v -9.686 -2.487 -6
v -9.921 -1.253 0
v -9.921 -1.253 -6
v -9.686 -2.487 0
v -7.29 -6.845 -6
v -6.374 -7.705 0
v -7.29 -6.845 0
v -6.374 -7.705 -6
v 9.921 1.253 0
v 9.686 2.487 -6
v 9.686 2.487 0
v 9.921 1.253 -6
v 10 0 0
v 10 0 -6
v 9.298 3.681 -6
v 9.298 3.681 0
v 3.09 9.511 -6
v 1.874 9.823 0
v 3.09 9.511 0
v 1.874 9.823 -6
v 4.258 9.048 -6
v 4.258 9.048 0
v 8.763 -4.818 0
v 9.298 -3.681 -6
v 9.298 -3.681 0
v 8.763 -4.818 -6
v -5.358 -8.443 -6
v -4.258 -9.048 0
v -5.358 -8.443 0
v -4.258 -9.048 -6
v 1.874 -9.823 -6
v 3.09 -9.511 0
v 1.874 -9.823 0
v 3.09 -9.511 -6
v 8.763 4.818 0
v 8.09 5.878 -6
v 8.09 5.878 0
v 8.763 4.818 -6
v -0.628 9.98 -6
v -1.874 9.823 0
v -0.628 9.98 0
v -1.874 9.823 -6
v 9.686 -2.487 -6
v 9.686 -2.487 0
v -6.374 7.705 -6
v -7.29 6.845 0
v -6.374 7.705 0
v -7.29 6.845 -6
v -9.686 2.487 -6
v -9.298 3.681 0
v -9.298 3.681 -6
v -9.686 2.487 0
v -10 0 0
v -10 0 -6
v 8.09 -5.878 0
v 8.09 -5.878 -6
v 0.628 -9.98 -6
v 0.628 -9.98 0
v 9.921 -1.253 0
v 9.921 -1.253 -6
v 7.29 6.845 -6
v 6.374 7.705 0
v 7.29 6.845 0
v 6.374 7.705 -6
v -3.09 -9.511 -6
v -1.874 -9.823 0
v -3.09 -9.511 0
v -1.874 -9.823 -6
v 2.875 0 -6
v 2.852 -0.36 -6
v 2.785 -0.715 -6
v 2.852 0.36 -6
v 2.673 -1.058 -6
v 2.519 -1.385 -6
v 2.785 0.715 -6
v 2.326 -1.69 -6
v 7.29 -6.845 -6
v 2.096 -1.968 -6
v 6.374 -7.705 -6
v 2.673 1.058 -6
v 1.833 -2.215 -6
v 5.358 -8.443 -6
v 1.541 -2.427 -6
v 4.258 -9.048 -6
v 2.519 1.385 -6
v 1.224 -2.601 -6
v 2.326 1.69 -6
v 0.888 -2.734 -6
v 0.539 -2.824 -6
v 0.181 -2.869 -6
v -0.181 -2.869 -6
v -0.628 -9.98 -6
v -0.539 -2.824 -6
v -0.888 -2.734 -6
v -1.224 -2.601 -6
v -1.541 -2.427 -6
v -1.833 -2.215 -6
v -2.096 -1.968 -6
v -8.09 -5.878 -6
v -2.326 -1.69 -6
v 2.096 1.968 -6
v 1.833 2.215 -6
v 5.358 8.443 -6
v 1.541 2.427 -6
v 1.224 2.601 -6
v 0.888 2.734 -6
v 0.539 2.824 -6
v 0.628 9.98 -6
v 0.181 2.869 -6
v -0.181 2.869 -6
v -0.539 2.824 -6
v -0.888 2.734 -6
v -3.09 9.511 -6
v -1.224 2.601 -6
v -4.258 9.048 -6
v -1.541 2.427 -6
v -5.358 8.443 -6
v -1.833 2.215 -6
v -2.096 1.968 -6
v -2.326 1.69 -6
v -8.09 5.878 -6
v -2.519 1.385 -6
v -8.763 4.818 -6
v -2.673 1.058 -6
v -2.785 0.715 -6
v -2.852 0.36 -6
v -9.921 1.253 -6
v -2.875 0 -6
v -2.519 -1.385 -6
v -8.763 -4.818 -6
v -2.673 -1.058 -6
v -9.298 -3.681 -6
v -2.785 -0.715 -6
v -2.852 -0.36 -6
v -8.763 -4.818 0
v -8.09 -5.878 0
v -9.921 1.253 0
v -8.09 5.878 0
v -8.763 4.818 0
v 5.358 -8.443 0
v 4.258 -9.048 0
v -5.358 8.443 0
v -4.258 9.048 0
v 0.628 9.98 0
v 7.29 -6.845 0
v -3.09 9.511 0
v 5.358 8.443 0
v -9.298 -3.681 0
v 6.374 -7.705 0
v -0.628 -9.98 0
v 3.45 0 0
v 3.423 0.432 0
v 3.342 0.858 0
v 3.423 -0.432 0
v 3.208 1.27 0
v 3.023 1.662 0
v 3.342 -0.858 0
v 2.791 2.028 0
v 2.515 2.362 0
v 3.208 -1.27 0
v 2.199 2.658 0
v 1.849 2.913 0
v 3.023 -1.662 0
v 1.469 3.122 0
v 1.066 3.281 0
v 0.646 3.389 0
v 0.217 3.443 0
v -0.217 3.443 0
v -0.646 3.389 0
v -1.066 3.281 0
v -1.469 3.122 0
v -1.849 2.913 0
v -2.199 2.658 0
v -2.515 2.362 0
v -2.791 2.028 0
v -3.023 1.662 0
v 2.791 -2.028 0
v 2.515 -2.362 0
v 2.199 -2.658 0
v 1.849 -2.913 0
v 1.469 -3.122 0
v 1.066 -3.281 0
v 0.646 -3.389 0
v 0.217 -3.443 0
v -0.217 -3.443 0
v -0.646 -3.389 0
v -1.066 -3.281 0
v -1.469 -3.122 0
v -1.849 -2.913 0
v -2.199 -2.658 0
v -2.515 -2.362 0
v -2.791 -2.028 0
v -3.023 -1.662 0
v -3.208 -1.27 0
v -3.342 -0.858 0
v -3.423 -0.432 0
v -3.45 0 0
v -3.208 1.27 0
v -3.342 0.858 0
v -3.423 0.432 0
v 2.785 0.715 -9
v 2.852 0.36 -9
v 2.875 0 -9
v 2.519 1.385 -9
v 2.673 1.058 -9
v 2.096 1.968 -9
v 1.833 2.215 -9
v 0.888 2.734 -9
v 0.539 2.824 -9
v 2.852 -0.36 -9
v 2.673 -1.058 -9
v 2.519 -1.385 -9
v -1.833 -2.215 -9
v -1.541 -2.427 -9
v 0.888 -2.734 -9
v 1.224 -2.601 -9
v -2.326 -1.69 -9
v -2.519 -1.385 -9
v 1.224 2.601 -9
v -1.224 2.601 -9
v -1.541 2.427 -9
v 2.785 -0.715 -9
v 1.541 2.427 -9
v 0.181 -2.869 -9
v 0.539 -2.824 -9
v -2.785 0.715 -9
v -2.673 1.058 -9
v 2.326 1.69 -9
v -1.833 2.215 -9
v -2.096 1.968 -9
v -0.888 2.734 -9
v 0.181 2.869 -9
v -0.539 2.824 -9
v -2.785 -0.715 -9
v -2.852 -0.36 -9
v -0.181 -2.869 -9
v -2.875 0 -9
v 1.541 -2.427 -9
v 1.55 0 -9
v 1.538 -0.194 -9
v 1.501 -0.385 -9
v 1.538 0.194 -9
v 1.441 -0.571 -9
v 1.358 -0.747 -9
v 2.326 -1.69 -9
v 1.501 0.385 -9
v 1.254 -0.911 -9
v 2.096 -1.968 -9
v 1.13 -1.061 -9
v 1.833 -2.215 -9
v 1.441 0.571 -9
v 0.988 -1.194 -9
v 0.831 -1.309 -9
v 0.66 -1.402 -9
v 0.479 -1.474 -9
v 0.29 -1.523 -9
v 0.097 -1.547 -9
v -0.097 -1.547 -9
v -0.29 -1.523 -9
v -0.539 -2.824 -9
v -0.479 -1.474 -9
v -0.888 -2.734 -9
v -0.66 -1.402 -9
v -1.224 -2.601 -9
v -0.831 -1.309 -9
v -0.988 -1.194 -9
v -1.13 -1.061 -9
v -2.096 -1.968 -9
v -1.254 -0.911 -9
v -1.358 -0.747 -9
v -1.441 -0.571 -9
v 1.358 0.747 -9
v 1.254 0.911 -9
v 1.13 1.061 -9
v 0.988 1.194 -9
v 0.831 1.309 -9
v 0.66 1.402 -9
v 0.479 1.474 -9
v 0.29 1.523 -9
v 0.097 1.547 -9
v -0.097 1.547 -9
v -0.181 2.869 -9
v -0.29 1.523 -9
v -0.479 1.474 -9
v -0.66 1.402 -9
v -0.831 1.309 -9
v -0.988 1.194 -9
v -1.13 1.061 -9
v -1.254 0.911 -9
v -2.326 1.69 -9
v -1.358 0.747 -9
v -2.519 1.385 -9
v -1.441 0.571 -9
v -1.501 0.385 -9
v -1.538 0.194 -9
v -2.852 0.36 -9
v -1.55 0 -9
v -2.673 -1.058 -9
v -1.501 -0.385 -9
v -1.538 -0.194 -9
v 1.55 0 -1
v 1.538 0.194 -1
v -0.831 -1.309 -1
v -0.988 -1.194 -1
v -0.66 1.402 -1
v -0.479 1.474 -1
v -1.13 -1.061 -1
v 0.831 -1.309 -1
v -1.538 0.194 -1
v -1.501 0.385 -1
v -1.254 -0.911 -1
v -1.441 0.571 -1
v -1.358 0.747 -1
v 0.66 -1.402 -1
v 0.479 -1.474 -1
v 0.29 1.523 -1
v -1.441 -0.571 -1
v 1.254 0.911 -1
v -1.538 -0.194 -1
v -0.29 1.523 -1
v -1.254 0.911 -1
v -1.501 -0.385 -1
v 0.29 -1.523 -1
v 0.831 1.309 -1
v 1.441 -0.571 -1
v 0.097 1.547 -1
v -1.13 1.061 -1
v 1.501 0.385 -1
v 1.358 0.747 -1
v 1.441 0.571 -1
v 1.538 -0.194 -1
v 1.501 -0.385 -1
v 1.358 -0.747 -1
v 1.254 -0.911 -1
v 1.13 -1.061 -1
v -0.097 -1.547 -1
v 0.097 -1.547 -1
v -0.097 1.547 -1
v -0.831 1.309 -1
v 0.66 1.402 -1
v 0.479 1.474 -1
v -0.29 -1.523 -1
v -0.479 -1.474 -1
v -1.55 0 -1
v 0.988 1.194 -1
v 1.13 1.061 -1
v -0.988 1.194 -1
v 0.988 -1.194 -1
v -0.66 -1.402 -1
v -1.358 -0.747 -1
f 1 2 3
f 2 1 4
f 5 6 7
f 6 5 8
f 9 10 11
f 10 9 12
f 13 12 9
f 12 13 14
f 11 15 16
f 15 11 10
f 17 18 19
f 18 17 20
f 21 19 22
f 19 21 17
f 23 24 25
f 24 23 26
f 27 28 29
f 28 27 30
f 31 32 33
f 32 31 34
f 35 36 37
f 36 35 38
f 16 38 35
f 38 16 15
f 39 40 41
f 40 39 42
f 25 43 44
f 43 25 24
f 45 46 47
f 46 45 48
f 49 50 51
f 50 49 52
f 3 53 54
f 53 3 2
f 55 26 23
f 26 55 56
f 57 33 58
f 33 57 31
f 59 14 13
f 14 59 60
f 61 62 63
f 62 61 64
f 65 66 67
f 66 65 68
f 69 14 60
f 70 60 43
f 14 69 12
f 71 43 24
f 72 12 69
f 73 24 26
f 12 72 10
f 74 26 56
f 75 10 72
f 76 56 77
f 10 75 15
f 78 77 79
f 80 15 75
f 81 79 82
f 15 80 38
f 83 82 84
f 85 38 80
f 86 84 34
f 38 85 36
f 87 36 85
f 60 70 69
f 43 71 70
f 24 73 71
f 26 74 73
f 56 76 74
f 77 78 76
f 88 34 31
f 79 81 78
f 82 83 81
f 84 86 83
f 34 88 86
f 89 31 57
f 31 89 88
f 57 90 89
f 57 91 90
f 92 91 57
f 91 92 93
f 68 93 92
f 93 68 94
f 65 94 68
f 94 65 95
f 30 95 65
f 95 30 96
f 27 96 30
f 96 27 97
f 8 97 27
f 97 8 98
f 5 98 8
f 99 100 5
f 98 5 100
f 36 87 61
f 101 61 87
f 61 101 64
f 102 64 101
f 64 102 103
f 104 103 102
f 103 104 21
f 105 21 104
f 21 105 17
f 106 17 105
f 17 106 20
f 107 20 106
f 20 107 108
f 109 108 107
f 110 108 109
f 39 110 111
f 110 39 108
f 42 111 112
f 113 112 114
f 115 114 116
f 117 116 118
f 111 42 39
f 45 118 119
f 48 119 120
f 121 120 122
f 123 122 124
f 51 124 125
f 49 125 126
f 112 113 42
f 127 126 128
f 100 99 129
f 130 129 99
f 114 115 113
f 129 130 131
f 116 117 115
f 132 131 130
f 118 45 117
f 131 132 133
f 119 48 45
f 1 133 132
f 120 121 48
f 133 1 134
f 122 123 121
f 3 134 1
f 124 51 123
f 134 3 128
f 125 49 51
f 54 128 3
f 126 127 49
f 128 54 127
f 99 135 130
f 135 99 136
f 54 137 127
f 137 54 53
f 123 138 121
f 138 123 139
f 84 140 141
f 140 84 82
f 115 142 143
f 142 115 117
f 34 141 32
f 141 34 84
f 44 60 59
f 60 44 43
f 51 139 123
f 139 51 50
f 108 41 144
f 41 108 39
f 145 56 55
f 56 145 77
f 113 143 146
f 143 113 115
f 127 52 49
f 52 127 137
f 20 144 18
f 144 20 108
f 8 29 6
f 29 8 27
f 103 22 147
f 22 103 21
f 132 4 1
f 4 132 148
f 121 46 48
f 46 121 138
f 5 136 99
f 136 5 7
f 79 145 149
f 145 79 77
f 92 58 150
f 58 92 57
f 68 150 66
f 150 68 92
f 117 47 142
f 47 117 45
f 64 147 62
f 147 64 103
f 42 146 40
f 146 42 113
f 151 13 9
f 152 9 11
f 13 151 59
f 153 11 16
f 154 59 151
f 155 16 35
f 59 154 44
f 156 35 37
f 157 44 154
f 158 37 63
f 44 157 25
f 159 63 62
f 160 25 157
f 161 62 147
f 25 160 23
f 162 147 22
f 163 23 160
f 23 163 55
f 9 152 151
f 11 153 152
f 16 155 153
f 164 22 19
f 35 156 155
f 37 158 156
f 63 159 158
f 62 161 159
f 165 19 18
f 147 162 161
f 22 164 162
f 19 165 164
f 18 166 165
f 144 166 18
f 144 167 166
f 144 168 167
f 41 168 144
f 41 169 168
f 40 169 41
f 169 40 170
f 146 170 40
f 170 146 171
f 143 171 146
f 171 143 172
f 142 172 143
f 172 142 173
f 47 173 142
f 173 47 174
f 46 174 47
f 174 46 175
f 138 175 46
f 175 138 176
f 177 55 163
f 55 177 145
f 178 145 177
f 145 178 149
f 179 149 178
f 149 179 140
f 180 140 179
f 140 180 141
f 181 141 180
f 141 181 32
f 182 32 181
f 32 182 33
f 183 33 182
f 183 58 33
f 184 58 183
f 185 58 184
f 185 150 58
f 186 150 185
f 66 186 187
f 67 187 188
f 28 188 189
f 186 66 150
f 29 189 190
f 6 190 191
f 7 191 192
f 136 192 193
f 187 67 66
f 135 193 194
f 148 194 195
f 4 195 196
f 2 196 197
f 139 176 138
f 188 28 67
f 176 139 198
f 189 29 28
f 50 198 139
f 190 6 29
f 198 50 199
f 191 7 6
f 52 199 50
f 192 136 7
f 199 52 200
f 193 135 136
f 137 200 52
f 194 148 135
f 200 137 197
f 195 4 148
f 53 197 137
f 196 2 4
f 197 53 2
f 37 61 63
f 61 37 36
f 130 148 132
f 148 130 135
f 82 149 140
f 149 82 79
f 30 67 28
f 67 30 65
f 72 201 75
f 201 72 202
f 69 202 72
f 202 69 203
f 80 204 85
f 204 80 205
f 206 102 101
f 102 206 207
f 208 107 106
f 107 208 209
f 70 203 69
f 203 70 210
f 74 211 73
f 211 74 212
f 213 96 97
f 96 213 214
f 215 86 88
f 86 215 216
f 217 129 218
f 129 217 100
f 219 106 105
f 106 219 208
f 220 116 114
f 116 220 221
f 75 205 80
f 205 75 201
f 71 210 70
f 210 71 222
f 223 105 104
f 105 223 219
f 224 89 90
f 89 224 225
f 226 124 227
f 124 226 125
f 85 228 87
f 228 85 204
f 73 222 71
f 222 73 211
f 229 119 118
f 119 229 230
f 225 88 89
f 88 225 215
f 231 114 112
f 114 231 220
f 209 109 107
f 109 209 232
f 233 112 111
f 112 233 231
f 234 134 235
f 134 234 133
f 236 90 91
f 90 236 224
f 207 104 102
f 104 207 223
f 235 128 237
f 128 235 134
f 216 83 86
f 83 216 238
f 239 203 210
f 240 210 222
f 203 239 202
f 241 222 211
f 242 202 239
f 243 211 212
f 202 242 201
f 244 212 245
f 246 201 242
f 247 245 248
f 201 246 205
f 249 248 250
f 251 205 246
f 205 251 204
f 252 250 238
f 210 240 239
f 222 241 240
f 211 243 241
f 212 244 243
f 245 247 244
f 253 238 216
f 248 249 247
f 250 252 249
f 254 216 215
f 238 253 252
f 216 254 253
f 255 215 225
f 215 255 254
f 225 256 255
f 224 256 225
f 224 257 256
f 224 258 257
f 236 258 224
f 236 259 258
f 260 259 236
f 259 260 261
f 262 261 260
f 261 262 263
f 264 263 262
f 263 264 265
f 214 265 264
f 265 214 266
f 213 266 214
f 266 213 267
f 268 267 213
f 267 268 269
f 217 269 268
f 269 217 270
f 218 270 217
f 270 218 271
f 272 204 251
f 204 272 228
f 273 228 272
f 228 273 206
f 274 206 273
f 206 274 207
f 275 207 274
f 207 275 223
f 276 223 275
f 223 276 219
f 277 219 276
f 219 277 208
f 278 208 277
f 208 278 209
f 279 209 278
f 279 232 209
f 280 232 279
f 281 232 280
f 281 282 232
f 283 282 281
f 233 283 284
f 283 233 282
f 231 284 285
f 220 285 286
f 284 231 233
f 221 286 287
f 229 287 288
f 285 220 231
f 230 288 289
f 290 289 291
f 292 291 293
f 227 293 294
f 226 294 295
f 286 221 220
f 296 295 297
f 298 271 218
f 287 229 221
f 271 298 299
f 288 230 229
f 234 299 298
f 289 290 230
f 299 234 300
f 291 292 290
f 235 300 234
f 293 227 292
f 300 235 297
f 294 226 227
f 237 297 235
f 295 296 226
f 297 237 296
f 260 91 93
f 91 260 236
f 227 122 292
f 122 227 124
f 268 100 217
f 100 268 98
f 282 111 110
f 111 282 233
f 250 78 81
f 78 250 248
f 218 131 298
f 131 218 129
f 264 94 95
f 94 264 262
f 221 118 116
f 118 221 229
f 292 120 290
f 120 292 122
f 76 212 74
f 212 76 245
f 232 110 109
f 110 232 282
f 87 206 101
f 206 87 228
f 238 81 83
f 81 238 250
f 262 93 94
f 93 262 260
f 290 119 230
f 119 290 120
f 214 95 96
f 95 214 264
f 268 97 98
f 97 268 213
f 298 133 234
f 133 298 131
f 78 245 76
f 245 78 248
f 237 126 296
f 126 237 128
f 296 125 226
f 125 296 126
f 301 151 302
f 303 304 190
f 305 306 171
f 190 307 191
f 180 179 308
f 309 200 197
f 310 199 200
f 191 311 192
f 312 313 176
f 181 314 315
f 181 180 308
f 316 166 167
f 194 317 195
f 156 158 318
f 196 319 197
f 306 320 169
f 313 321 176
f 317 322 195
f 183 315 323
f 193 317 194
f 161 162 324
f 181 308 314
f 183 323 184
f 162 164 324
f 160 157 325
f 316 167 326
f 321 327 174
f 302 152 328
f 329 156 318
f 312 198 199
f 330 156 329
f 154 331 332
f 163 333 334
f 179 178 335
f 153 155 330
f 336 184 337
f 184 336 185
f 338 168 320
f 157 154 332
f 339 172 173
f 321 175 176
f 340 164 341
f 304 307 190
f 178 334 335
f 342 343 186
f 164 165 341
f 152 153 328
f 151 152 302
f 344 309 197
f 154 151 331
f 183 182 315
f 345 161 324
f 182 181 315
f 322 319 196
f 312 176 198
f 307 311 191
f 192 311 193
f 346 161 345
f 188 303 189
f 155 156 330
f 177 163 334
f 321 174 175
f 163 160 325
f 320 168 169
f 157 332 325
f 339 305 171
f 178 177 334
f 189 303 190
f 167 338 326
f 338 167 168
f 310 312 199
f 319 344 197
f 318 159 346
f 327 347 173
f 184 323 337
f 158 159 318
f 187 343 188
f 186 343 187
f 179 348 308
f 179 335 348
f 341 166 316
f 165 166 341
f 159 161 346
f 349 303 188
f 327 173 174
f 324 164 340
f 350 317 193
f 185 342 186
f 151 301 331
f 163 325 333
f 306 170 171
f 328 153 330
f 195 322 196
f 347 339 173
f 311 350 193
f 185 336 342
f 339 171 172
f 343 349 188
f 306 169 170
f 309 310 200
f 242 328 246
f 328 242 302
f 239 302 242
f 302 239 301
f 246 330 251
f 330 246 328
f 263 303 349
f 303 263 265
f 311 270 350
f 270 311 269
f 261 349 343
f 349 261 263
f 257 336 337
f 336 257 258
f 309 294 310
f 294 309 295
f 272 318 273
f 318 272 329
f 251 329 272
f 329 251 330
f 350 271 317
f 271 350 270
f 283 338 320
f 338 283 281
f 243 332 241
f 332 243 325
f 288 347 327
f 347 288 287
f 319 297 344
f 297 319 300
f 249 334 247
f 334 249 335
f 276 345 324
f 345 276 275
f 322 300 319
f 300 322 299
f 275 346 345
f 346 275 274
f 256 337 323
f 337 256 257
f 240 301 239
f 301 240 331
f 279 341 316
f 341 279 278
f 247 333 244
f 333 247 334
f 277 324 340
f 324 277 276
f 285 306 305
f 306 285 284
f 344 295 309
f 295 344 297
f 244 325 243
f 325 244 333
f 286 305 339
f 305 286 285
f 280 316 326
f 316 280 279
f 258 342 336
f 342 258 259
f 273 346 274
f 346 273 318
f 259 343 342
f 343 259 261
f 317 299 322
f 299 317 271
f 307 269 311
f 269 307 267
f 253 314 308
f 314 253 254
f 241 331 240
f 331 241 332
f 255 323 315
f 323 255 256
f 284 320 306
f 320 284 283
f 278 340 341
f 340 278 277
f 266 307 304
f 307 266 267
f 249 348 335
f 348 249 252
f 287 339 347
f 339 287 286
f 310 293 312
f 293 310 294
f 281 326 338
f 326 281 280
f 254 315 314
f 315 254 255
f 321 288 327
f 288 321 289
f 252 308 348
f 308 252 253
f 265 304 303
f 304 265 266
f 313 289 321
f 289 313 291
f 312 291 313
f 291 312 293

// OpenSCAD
$fn = 50;


difference() {
	union() {
		translate(v = [0, 0, -6.0000000000]) {
			cylinder(h = 6, r = 10.0000000000);
		}
		#translate(v = [0, 0, -9.0000000000]) {
			cylinder(h = 9, r = 2.8750000000);
		}
	}
	union() {
		translate(v = [0, 0, 0]) {
			rotate(a = [0, 0, 0]) {
				difference() {
					union() {
						translate(v = [0, 0, -9.0000000000]) {
							cylinder(h = 9, r = 1.2500000000);
						}
						translate(v = [0, 0, -1.0000000000]) {
							cylinder(h = 1.0000000000, r1 = 1.5500000000, r2 = 3.4500000000);
						}
						translate(v = [0, 0, -9.0000000000]) {
							cylinder(h = 9, r = 1.5500000000);
						}
						translate(v = [0, 0, -9.0000000000]) {
							cylinder(h = 9, r = 1.2500000000);
						}
					}
					union();
				}
			}
		}
	}
}
